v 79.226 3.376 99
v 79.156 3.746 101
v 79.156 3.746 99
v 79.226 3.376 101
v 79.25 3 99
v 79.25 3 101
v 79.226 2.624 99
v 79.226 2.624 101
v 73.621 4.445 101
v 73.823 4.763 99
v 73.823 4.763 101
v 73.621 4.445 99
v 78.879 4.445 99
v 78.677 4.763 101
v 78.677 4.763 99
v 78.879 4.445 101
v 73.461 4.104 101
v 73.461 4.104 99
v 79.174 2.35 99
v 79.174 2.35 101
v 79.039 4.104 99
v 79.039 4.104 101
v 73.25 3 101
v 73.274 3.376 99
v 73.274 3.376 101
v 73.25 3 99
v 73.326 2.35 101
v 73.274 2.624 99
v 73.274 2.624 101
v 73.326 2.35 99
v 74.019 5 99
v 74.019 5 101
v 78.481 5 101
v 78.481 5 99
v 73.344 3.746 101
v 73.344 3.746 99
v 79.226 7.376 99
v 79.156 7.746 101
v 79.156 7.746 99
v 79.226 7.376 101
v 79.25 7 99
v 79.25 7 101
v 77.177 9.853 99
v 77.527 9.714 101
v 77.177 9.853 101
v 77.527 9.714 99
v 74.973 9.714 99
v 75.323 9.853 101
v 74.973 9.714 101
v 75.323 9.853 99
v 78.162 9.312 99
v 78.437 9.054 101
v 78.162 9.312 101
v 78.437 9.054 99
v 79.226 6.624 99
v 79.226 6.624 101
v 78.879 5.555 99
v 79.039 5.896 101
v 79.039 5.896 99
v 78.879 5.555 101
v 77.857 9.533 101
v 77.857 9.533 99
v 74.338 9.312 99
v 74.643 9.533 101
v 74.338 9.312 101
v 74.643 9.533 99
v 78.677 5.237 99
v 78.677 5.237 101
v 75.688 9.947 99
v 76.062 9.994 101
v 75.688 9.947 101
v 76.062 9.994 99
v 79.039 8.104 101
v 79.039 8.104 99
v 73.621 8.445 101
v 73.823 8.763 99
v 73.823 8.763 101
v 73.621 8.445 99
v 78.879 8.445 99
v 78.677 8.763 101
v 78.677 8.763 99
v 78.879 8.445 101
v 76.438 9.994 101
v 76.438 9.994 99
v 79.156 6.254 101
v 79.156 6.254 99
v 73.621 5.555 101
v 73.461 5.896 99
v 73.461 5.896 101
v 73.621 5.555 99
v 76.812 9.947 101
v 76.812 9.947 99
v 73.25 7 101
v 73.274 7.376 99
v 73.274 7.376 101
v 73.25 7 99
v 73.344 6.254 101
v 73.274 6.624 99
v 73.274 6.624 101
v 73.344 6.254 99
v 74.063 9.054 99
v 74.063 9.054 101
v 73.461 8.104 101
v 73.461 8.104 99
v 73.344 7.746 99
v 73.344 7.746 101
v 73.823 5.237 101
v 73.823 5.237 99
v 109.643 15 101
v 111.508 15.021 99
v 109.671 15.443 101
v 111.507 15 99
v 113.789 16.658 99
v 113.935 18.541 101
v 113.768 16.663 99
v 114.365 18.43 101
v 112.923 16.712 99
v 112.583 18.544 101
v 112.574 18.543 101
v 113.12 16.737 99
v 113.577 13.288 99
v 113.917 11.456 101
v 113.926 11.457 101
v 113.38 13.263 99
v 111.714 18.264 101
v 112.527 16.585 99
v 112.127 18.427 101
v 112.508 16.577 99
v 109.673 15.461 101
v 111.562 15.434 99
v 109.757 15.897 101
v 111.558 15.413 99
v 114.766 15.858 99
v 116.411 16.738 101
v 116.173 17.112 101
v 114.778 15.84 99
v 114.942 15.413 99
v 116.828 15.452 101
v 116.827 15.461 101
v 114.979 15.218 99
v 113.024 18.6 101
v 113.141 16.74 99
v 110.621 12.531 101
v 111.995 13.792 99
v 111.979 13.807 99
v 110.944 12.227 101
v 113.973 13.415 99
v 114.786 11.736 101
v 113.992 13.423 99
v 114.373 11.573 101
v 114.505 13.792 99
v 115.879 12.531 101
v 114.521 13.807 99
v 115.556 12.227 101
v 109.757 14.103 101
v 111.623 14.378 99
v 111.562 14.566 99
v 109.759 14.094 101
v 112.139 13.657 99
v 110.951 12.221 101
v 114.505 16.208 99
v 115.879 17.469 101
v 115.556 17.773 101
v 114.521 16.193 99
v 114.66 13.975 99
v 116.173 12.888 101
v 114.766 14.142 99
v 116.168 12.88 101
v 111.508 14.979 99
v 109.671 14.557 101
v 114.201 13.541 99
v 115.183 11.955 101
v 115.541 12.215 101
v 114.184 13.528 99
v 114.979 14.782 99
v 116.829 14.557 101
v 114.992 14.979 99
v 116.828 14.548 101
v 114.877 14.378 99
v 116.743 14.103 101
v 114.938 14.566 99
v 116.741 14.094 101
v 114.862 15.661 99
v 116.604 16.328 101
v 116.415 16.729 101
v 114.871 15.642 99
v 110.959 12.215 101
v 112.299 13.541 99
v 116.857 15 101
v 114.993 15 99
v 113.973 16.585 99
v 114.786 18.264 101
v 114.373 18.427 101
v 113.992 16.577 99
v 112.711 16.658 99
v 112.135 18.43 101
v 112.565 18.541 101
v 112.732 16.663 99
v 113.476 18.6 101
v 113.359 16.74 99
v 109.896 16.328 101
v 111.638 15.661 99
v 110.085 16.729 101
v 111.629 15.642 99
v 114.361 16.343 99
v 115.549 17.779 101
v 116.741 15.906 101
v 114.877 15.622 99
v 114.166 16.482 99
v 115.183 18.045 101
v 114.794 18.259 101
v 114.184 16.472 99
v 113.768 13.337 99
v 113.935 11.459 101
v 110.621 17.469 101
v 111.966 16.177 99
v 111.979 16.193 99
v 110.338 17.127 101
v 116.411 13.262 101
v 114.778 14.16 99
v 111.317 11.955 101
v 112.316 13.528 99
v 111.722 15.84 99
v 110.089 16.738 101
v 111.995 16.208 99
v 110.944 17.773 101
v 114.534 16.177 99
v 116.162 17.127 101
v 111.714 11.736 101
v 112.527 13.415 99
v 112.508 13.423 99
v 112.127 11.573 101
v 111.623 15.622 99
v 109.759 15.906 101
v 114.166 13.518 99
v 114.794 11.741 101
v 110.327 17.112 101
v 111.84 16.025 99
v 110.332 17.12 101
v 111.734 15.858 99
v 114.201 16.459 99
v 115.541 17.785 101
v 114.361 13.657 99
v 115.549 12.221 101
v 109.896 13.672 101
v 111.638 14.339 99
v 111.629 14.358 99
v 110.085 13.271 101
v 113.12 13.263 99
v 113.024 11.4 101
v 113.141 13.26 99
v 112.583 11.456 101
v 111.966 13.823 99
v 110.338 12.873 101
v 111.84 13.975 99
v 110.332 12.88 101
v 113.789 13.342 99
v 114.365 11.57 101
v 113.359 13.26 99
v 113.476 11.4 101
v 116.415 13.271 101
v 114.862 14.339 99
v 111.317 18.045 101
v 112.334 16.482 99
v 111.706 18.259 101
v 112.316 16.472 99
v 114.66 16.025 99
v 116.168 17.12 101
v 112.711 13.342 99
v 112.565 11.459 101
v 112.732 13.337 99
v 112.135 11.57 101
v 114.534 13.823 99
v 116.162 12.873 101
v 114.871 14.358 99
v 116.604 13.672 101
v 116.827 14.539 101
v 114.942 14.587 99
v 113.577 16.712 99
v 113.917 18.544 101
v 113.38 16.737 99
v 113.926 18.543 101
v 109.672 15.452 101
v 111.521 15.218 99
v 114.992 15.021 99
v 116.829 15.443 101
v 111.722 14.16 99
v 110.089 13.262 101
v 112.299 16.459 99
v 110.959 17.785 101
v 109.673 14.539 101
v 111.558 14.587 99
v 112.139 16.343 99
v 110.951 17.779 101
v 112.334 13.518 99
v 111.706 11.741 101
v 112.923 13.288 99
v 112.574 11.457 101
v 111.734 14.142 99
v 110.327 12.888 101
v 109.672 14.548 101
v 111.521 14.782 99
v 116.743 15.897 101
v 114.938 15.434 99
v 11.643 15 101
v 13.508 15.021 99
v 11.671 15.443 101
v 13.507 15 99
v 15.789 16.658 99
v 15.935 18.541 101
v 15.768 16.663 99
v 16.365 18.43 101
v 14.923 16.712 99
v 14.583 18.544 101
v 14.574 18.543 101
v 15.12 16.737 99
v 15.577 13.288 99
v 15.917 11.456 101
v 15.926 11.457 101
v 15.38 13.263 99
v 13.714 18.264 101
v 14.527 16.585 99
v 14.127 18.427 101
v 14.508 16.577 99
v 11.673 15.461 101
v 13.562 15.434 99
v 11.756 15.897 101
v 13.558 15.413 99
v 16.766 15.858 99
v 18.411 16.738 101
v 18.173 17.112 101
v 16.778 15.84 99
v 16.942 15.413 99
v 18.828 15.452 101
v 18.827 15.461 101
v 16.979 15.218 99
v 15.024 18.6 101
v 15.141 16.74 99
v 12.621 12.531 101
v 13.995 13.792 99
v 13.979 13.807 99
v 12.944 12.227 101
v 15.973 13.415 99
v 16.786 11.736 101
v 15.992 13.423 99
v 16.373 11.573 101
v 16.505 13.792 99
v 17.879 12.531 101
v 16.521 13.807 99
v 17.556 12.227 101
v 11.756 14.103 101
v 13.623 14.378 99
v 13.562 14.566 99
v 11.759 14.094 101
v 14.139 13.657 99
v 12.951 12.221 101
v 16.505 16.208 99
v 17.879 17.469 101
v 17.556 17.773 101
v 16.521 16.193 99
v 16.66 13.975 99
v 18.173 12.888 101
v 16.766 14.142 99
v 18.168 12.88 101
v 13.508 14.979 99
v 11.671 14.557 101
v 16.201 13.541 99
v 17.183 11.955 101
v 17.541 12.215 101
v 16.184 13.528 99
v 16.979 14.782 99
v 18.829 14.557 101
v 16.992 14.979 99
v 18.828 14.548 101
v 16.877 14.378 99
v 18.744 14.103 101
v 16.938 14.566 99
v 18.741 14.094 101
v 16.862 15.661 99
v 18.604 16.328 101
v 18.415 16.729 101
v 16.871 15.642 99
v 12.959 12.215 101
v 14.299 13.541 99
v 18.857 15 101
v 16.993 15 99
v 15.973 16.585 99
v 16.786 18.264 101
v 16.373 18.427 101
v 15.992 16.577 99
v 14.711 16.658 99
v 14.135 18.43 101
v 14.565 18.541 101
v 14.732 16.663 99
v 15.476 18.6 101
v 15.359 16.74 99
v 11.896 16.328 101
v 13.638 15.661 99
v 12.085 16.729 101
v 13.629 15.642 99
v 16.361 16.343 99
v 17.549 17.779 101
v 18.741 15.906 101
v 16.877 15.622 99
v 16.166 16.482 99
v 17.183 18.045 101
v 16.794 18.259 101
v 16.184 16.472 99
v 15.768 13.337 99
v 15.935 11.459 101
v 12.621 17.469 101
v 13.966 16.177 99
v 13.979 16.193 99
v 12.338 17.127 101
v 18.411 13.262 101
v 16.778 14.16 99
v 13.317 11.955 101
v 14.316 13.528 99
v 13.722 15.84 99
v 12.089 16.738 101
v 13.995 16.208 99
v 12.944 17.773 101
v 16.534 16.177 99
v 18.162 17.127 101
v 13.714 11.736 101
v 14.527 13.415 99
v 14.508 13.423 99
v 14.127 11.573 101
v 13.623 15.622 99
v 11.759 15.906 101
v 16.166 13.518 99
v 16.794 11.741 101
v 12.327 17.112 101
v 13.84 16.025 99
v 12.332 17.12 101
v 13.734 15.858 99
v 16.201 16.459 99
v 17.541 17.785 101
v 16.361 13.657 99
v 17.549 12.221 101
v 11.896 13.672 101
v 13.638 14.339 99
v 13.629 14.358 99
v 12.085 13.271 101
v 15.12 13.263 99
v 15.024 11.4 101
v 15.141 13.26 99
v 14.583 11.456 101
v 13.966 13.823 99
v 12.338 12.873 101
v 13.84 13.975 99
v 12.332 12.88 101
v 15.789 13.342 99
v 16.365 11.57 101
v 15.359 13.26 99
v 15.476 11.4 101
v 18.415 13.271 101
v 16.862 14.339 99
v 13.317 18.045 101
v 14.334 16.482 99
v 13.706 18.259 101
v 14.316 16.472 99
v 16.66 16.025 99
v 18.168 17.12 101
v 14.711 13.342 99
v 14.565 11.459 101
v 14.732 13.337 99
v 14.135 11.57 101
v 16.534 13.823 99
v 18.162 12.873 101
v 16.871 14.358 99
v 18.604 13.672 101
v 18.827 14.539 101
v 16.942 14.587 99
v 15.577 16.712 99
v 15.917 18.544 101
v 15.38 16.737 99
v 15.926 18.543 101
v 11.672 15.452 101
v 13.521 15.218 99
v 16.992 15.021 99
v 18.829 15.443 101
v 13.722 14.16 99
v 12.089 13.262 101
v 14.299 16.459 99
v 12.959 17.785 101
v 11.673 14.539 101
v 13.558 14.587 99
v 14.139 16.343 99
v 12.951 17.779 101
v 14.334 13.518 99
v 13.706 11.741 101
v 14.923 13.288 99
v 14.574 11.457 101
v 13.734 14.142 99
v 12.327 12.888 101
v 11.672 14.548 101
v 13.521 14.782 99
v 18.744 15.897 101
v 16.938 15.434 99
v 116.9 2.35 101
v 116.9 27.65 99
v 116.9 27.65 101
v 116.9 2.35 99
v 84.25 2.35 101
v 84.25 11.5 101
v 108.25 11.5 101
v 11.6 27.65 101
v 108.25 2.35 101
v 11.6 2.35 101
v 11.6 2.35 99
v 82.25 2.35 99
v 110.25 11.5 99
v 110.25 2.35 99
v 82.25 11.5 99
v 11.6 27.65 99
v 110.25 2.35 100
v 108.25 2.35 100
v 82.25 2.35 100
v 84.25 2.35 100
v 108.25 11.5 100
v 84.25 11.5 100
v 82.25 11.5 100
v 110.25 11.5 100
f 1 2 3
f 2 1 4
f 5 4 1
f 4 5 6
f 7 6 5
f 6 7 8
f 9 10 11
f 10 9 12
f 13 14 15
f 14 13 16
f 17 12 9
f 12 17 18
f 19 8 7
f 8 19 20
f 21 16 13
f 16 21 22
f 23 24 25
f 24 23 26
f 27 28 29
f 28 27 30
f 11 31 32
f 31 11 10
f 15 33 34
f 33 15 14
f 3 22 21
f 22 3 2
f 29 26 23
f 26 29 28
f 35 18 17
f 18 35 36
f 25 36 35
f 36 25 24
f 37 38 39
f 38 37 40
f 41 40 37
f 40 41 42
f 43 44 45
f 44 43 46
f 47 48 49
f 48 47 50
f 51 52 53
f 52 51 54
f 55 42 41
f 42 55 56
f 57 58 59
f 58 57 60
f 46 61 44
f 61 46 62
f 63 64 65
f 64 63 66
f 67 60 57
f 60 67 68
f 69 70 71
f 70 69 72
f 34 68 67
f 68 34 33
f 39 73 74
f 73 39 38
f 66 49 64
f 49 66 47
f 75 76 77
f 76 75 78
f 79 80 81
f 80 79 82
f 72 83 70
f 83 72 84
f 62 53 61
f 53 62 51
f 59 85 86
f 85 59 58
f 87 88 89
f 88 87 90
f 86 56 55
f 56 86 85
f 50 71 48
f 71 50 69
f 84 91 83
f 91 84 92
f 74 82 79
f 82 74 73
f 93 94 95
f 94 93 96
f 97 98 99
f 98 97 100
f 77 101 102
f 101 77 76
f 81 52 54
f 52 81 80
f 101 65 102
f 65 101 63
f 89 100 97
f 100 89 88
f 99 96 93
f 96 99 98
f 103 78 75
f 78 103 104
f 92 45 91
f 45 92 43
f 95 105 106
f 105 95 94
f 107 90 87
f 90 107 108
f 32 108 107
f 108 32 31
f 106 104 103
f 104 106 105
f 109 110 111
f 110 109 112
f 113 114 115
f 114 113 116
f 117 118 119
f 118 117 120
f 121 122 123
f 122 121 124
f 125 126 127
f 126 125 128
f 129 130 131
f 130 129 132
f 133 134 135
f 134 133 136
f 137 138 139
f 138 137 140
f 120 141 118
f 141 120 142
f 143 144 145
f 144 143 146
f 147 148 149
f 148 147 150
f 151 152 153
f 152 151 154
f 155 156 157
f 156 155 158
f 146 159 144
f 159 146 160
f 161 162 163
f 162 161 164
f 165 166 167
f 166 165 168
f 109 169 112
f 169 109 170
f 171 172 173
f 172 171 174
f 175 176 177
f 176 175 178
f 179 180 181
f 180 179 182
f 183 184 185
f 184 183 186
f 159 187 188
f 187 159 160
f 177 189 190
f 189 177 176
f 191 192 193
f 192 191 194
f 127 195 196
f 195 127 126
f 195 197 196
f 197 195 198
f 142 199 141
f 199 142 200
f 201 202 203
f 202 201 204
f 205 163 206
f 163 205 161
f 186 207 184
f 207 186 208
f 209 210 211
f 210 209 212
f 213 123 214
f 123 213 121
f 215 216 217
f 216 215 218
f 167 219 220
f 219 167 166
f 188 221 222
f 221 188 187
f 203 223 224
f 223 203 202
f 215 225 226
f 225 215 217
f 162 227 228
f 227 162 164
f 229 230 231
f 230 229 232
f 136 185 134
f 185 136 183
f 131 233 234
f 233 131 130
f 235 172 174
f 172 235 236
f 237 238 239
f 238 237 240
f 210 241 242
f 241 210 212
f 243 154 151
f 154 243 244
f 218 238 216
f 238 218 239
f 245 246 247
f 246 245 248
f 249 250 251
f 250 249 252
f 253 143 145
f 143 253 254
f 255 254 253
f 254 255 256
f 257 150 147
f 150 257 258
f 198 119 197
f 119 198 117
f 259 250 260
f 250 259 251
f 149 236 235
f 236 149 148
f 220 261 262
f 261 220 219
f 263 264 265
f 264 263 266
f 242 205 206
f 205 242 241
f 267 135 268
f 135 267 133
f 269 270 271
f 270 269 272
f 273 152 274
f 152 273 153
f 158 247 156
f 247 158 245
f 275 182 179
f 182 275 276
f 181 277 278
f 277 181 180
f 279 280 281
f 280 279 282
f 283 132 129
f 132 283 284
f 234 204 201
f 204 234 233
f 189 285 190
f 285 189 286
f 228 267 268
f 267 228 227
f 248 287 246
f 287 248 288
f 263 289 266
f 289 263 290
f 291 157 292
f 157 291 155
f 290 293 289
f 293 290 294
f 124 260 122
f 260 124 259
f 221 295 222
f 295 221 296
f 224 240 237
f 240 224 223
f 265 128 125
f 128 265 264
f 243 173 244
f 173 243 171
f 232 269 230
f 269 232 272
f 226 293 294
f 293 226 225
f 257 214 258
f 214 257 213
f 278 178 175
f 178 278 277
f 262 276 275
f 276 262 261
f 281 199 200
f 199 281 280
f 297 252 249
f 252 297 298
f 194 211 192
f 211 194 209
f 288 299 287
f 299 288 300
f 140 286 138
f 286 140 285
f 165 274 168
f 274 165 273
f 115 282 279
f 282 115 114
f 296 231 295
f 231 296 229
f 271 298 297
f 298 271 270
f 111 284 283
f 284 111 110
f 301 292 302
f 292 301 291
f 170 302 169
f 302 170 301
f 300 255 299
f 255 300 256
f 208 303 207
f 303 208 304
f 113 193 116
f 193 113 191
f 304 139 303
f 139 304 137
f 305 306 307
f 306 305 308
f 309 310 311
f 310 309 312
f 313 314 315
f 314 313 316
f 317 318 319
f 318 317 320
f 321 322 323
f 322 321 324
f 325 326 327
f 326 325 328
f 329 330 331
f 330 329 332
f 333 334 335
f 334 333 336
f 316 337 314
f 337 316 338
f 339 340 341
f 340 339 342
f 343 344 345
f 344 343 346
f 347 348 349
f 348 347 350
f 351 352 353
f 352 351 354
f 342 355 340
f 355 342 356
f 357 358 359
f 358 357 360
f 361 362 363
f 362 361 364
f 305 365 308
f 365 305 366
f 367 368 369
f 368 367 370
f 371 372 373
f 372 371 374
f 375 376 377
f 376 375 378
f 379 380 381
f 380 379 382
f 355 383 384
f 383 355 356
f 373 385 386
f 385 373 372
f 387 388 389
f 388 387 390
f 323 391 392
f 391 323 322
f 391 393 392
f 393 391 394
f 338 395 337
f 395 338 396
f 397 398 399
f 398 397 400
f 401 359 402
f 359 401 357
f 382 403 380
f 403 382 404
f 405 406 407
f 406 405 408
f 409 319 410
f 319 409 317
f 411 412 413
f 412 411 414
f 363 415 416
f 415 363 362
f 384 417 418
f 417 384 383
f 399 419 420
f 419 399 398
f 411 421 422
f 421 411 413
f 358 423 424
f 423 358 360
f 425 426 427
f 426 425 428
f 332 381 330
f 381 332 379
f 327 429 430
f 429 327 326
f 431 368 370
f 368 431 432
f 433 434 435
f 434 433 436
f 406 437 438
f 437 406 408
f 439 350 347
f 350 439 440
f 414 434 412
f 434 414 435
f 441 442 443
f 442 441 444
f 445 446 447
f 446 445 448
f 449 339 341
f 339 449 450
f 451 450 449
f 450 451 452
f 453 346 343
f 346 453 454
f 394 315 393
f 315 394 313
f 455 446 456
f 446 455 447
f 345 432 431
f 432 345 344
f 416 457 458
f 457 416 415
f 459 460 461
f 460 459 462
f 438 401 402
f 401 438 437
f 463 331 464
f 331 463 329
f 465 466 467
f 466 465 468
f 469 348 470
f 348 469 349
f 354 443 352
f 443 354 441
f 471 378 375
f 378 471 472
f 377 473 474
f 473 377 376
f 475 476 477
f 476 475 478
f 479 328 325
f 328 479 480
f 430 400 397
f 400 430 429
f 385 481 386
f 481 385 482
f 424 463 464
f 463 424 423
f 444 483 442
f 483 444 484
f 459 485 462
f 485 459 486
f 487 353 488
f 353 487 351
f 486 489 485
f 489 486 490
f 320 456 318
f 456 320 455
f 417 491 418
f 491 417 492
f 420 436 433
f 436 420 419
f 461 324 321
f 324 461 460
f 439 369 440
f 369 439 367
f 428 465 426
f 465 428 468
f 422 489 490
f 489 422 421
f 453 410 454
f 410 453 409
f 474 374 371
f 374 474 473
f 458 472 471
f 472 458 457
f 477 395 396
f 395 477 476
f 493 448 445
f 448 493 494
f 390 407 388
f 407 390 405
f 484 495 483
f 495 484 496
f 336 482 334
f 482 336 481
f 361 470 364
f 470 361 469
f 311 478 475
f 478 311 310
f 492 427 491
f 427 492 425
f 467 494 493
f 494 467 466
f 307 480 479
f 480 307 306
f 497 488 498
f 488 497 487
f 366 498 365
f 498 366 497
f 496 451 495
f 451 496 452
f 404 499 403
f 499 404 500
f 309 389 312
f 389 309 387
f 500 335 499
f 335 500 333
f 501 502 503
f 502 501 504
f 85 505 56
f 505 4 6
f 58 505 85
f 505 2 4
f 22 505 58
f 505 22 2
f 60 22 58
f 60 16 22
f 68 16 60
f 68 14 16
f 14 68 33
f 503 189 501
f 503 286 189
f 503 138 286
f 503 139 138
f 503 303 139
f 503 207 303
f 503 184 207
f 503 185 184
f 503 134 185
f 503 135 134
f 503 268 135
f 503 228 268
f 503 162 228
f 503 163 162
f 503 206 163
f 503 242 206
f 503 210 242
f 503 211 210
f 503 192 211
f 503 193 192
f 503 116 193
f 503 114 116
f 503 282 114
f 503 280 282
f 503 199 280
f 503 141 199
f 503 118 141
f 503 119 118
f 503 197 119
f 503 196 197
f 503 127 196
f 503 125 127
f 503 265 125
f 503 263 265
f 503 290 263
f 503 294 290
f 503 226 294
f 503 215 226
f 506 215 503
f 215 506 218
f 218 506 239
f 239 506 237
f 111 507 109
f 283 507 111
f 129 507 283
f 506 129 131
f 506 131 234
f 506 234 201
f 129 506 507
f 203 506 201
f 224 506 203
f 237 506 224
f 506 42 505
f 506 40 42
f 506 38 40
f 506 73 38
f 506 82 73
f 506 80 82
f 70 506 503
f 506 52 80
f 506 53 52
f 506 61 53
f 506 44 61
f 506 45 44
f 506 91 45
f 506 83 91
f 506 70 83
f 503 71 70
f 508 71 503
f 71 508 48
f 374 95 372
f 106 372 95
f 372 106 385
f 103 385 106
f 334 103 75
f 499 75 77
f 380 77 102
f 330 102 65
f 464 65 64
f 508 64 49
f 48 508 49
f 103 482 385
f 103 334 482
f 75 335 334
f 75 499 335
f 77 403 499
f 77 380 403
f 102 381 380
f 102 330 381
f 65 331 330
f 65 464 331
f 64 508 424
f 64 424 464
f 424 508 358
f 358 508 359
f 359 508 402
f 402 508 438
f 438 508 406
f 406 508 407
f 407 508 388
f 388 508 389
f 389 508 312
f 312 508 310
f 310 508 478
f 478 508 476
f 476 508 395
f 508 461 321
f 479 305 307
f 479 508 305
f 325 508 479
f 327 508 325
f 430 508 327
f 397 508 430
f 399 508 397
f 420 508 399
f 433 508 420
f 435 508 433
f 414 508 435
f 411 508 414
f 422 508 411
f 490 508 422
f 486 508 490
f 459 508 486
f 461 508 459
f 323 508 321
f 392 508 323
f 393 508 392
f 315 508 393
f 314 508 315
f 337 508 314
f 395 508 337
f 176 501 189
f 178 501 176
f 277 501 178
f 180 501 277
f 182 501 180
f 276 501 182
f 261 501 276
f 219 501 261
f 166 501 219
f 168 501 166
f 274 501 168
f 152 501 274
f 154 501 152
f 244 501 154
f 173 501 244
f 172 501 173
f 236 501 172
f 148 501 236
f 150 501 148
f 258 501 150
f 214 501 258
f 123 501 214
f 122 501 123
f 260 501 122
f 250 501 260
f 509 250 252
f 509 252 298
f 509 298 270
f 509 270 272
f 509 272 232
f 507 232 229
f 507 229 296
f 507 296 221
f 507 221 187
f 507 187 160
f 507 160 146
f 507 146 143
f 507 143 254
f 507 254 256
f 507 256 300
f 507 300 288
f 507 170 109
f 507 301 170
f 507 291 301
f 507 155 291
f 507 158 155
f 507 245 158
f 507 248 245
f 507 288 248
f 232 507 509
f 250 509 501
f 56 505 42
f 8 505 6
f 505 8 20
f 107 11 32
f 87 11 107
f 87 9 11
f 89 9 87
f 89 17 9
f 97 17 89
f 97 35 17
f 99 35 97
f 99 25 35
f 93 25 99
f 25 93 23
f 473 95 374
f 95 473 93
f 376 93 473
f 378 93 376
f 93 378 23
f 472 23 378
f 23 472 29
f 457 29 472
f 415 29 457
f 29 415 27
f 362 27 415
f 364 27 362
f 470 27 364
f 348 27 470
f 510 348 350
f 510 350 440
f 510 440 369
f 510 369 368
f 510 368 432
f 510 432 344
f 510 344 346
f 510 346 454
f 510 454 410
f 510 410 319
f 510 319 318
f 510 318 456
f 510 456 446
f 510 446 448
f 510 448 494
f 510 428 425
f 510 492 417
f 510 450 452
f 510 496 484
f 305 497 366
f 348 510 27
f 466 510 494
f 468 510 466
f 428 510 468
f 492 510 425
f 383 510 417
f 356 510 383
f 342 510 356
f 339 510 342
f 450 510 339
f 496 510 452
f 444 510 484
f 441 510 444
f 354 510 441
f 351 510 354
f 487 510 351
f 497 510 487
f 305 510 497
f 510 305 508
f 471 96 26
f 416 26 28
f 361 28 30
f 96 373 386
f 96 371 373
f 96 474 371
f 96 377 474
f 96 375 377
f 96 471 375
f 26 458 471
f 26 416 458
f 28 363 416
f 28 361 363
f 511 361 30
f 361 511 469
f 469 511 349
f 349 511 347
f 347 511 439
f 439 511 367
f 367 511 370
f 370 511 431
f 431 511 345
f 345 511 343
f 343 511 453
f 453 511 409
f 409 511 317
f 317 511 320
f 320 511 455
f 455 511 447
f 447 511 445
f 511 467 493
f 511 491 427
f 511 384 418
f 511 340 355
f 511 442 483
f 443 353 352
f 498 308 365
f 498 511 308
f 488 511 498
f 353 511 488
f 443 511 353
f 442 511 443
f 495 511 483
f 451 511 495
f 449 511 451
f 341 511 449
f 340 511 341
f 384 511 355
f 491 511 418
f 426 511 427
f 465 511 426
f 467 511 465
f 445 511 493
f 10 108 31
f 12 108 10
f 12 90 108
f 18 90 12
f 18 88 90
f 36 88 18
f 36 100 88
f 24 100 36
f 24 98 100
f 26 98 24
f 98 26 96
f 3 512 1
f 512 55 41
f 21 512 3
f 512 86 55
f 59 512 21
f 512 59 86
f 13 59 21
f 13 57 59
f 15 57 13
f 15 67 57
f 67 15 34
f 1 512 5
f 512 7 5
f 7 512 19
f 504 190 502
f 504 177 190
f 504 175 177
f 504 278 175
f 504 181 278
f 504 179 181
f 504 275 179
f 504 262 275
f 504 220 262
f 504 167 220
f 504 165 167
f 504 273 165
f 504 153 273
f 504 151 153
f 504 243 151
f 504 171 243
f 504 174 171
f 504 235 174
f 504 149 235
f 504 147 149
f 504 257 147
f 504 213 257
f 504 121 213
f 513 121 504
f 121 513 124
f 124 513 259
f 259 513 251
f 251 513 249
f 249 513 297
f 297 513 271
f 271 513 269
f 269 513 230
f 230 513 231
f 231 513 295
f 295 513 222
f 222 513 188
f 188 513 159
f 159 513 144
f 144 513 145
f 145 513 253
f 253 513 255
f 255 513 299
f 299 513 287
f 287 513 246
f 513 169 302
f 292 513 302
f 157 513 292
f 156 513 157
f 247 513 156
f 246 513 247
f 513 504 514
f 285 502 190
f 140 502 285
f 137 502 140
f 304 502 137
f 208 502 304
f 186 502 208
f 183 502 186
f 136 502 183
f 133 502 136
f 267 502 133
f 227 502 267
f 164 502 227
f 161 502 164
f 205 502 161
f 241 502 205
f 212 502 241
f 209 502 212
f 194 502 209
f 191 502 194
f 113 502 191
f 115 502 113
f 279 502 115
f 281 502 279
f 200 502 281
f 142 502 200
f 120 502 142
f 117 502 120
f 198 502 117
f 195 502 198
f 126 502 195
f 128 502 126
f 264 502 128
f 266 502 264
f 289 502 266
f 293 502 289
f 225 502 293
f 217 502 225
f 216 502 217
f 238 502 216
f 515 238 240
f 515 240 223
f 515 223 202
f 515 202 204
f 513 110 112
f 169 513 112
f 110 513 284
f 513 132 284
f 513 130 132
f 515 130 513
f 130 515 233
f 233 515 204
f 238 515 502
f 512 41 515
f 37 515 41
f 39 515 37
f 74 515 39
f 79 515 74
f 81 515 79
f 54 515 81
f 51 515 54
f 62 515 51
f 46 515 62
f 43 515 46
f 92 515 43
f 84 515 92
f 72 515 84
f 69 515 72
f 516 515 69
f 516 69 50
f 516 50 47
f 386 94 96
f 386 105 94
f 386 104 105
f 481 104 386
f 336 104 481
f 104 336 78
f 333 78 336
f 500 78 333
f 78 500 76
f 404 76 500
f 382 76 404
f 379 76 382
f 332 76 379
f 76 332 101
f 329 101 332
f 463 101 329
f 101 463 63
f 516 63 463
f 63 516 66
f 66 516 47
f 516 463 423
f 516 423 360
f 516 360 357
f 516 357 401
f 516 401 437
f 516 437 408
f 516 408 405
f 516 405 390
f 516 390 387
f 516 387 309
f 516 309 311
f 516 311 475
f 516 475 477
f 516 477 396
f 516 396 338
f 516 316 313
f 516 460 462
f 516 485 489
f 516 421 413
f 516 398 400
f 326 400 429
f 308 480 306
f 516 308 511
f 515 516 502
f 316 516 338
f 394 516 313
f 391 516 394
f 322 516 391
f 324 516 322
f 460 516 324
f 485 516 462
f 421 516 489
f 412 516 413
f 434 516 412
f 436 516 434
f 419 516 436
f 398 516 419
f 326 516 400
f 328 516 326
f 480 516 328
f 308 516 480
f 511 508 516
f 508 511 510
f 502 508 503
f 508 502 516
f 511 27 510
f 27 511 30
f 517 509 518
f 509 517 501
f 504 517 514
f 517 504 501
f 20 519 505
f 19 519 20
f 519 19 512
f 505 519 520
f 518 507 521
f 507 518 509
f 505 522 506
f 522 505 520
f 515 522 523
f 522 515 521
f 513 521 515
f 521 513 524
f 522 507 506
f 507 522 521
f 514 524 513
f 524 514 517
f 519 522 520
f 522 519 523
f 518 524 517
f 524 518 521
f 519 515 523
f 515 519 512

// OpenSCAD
/* Raspberry Pi Eurorack Enclosure Generator 
 * Modified for purpose by @realtimekodi
 * https://github.com/Real-Time-Kodi/EuroServerRack/
 * Initially designed by KronBjorn
 * https://github.com/KronBjorn/SixInchRack
 * 
 * Creative Commons 4.0 Share Alike With Attribution -- Non-Comercial
 * http://creativecommons.org/licenses/by-nc-sa/4.0/
*/
include<../sixinch_library.scad>

print_frontplate_sml = false;
print_cabinet_sml    = false;
print_lid            = false;
print_rear           = true;

molex                = true;
barrel               = false;
barrel_dai           = 6.5;

Vent_Length          = 65;
Vent_Frequency       = 6;
Vent_Thickness       = 3;

Pi_Version           = "-"; // [3:B+2B+3B+, 4:4B]
Front_plate_holes    = "-"; // [2:2, 4:4]
Depth                = 98; //Depth of the case min is somewhere around 98
pi_offset_x          = 12;//minimum probably 10, 12 if using hats
pi_offset_y          = 24.5;//exactly where you want to be for front ports(24.5)
pi_offset_z          = 4;//minimum probably 4
standoff_hole_size   = 2.3;//2.3 for m2.5, 2.8 for m3
hp                   = 6; //How many hp units you want this to be min is prob 5

if(print_frontplate_sml){ // Frontplate //
    w=boffset+pi_offset_x-gauge_box;
    square_hole_3        = [ [37+w,pi_offset_z+0.5,17,15] , [20+w,pi_offset_z+1.5,15,16] , [2+w,pi_offset_z+1.5,15,16]];//3b+
    square_hole_4    = [ [2+w,pi_offset_z+0.5,17,15] , [22+w,pi_offset_z+1.5,15,16] , [40+w,pi_offset_z+1.5,15,16]];
    
    round_hole         = [];
    round_peg          = [];   
    screw_side_front   = [3];
    screw_top          = [];
    screw_bottom_front = [];
    
    square_hole = Pi_Version == "3" ? square_hole_3 : square_hole_4;
    
    frontplate(hp,square_hole,round_hole,round_peg,screw_side_front,screw_top,screw_bottom_front);
}

if(print_cabinet_sml){ // Cabinet //  
    w=pi_offset_x;
    h=pi_offset_y;
    screw_bottom_front = [];
    screw_side_front   = [3];
    round_peg          = [[w,h,6,standoff_hole_size,pi_offset_z],
                          [w+49,h,6,standoff_hole_size,pi_offset_z],
                          [w+49,h+58,6,standoff_hole_size,pi_offset_z],
                          [w,h+58,6,standoff_hole_size,pi_offset_z]];
    difference(){
        cabinet(Depth,hp,screw_bottom_front,round_peg,screw_side_front);
        //sd card access
        translate([w+boffset+gauge_box+24,0,h+58+gauge+7]) cube(size = [16,9,19], center=true);
    }

}

if(print_lid){ // Lid // 
    screw_front = [];//mm
    screw_back  = [];//mm
    lid(Depth,hp,screw_front,screw_back);        
}

if(print_rear){  // Back plate //    
    square_hole  = [[73,0,24,9.5]];
    round_hole   = [[65,1,6],[65,5,6]];
    screw_top    = [];//mm
    screw_bottom = [];//mm
    screw_side   = [3];
    difference() {
        back_plate(hp,Depth,screw_top,screw_bottom,screw_side,square_hole,round_hole);
        //Cut out for the molex
        translate([boffset+73+14,gauge_box+4.75,Depth+1]) cube([28,9.5,2], center=true);
    }
}  
